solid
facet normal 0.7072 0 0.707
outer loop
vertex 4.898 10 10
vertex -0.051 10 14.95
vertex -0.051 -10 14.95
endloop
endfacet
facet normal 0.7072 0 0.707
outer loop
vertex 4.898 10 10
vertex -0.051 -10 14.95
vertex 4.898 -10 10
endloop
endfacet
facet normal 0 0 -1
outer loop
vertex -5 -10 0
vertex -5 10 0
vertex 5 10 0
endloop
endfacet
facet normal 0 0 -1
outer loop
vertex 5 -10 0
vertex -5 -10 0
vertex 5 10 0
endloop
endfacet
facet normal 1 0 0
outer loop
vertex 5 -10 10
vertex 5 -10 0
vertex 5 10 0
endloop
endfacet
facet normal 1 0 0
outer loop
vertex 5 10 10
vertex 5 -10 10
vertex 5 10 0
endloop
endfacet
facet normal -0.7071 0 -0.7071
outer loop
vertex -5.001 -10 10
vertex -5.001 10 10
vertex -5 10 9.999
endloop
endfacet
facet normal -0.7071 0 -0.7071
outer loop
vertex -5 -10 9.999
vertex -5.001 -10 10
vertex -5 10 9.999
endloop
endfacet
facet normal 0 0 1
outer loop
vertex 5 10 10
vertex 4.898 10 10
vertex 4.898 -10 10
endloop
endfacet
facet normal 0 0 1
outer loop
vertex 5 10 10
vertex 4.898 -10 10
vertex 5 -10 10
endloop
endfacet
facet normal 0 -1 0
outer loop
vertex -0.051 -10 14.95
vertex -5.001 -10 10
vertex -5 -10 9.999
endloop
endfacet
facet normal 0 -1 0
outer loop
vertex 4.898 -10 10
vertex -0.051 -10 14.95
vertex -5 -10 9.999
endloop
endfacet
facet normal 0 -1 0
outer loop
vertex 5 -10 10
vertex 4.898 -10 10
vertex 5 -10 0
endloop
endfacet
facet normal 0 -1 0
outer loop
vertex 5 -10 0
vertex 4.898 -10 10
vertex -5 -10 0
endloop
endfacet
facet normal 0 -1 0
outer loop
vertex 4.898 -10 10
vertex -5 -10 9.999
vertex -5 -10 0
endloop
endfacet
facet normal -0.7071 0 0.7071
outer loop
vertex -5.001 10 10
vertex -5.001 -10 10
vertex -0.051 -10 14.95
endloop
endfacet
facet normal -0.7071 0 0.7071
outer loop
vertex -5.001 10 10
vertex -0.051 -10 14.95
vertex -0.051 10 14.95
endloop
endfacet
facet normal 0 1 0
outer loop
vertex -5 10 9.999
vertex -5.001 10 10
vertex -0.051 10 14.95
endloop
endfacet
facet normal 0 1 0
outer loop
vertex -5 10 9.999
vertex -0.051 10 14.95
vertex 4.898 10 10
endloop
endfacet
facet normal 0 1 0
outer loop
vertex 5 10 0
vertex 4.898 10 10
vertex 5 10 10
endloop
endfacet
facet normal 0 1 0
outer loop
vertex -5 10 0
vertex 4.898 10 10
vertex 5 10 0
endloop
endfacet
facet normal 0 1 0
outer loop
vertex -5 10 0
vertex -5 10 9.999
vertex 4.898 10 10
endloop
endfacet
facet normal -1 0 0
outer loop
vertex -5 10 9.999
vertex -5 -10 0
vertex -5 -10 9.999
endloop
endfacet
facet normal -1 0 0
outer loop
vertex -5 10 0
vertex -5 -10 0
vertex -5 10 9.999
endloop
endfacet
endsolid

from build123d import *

# Parameters (mm, degrees)
BOX001_W               = 7
BOX001_H               = 20
BOX001_DEPTH           = 7
BOX001_PLACEMENT_ANGLE = 45
BOX_W                  = 10
BOX_H                  = 20
BOX_DEPTH              = 10


with BuildPart() as cube001:
    # Box001 → Box001 (new body)
    with BuildSketch(Plane.XY):
        with Locations((3.5, 10)):
            Rectangle(BOX001_W, BOX001_H)
    extrude(amount=BOX001_DEPTH)


with BuildPart() as cube001_1:
    # Box001 placement: moved
    add(cube001.part.moved(Location((-0.0011, 0, 10))).rotate(Axis((-0.0011, 0, 10), (0, 1, 0)), BOX001_PLACEMENT_ANGLE))


with BuildPart() as fusion:
    # Box → Box (new body)
    with BuildSketch(Plane.XY):
        with Locations((5, 10)):
            Rectangle(BOX_W, BOX_H)
    extrude(amount=BOX_DEPTH)

    # Fusion: union Cube001
    add(cube001_1.part)


with BuildPart() as fusion_1:
    # Fusion placement: moved
    add(fusion.part.moved(Location((-5, -10, 0))))


solid = fusion_1.part
